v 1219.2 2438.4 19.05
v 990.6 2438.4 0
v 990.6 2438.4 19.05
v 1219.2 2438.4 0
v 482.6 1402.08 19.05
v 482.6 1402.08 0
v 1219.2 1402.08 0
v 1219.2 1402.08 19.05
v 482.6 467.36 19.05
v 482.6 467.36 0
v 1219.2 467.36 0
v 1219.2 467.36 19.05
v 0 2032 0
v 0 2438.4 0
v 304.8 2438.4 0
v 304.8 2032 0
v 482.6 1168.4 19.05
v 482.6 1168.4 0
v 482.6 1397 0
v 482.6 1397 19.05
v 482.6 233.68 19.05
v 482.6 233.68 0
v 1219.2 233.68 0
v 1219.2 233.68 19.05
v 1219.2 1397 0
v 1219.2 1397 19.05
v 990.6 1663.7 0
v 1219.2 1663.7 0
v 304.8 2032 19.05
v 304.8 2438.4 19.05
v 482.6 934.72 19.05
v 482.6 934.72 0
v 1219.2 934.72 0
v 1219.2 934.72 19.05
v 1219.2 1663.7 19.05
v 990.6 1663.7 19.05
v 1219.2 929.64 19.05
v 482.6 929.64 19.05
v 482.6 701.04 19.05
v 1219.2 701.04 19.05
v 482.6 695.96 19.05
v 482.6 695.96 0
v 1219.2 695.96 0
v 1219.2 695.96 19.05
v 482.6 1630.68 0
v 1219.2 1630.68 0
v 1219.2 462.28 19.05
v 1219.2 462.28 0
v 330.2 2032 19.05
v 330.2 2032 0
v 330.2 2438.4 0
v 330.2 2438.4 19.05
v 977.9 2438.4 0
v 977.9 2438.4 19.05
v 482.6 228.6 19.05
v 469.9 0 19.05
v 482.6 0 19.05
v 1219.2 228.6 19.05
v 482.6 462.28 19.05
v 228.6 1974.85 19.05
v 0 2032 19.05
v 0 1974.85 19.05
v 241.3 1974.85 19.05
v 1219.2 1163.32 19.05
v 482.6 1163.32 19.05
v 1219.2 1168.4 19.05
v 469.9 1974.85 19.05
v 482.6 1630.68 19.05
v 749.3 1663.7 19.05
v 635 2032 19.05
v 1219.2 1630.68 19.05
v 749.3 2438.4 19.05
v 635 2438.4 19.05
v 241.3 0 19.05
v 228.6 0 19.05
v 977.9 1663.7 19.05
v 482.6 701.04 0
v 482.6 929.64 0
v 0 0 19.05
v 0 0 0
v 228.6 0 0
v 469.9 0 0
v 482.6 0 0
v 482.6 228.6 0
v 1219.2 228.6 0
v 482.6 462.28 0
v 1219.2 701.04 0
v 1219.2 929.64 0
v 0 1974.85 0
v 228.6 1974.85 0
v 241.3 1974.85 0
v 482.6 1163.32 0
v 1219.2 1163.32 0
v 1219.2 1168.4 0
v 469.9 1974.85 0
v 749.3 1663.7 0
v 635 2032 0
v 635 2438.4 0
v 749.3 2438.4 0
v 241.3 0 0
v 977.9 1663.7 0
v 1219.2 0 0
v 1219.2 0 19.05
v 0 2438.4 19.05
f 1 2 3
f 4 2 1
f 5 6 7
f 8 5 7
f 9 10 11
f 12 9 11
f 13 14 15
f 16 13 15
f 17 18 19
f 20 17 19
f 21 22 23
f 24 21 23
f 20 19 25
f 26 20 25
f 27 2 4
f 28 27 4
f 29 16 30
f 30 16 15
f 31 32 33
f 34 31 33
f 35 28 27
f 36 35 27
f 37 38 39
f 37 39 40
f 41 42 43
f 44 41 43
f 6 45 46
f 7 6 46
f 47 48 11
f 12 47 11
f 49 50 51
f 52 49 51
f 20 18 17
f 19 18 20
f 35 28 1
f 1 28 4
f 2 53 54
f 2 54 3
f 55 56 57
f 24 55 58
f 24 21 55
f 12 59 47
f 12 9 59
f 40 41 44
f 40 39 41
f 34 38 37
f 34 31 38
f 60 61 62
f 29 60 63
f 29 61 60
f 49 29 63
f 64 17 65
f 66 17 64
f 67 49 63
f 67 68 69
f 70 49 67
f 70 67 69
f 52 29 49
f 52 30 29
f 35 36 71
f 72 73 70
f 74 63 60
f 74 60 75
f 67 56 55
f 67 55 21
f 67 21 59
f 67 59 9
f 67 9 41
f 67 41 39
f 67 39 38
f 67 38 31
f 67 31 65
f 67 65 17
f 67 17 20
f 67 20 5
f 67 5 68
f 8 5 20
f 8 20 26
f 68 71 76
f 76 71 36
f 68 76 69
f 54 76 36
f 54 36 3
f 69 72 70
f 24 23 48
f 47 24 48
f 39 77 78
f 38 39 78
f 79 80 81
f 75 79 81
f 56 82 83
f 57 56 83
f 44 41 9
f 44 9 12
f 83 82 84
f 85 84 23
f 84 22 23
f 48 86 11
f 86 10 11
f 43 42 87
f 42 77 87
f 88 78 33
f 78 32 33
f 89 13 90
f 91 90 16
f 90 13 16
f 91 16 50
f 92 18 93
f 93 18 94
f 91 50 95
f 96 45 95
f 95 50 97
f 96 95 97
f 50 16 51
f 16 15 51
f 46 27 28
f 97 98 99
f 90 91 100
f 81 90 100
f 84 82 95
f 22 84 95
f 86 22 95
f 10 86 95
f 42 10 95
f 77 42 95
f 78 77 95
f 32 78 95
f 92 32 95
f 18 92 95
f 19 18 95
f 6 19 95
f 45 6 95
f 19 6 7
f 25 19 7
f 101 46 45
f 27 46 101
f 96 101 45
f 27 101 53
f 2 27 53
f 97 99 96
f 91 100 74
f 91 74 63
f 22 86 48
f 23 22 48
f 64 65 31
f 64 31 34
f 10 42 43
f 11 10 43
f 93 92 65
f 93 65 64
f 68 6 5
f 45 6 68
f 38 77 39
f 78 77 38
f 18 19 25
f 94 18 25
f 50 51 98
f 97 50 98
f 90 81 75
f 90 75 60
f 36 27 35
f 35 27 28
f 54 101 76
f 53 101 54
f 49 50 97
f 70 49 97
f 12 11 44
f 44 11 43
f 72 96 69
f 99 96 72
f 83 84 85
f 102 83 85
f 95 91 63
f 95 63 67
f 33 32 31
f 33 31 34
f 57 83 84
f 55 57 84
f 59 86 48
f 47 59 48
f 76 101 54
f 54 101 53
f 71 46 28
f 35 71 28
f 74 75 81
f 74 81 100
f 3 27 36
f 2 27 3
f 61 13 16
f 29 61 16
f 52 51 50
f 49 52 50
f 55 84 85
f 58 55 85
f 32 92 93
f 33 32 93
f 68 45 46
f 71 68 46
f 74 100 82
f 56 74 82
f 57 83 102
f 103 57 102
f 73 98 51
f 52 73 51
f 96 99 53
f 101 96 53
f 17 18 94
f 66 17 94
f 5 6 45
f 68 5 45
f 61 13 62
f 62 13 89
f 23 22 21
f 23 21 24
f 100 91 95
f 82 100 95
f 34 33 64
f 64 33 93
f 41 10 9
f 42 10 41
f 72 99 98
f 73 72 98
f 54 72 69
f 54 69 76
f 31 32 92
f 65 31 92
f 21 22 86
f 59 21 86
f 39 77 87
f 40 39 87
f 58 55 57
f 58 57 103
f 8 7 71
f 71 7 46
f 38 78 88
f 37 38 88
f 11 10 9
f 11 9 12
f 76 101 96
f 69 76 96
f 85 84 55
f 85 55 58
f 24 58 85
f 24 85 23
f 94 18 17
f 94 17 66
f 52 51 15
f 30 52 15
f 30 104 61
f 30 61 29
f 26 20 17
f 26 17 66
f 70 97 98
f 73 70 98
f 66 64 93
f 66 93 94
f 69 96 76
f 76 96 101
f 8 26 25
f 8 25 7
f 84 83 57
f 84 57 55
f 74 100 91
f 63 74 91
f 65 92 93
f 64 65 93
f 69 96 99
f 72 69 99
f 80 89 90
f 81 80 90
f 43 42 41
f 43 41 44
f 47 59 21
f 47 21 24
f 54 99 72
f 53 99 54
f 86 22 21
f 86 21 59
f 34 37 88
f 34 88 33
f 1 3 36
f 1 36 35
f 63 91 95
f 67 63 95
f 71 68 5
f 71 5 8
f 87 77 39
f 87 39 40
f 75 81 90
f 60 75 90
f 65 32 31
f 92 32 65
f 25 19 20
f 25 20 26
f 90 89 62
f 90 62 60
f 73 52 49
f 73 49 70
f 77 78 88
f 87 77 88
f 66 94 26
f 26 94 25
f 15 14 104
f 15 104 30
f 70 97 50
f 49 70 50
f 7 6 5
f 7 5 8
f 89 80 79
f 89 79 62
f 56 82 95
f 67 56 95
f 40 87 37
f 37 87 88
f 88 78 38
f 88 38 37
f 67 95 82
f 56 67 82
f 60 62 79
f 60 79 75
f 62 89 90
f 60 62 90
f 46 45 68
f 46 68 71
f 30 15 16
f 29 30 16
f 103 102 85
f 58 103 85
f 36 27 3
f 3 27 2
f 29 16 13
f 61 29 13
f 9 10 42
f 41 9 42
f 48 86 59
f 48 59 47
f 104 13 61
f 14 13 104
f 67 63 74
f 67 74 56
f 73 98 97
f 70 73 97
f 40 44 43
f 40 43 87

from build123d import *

# Parameters (mm, degrees)
F0_W     = 12.7
F0_H     = 1974.85
F0_H_2   = 774.7
F0_W_2   = 736.6
F0_H_3   = 5.08
F1_DEPTH = 19.05
F0_W_3   = 228.6
F2_DEPTH = 19.05
F0_H_4   = 228.6
F0_W_4   = 304.8
F0_H_5   = 406.4


with BuildPart() as f1:
    # F0 (on Top) → F1 (new body)
    with BuildSketch(Plane.XY):
        Polygon((0, 2032), (0, 1974.85), (228.6, 1974.85), (241.3, 1974.85), (469.9, 1974.85), (469.9, 0), (482.6, 0), (482.6, 228.6), (482.6, 233.68), (482.6, 462.28), (482.6, 467.36), (482.6, 695.96), (482.6, 701.04), (482.6, 929.64), (482.6, 934.72), (482.6, 1163.32), (482.6, 1168.4), (482.6, 1397), (482.6, 1402.08), (482.6, 1630.68), (1219.2, 1630.68), (1219.2, 1663.7), (990.6, 1663.7), (977.9, 1663.7), (749.3, 1663.7), (749.3, 2438.4), (679.45, 2438.4), (635, 2438.4), (635, 2032), (330.2, 2032), (330.2, 2438.4), (304.8, 2438.4), (304.8, 2032), align=None)
        with Locations((234.95, 987.425)):
            Rectangle(F0_W, F0_H)
        with Locations((984.25, 2051.05)):
            Rectangle(F0_W, F0_H_2)
        with Locations((850.9, 1399.54)):
            Rectangle(F0_W_2, F0_H_3)
        with Locations((850.9, 1165.86)):
            Rectangle(F0_W_2, F0_H_3)
        with Locations((850.9, 932.18)):
            Rectangle(F0_W_2, F0_H_3)
        with Locations((850.9, 698.5)):
            Rectangle(F0_W_2, F0_H_3)
        with Locations((850.9, 464.82)):
            Rectangle(F0_W_2, F0_H_3)
        with Locations((850.9, 231.14)):
            Rectangle(F0_W_2, F0_H_3)
    extrude(amount=F1_DEPTH)


with BuildPart() as f2:
    # F0 (on Top) → F2 (new body)
    with BuildSketch(Plane.XY):
        with Locations((114.3, 987.425)):
            Rectangle(F0_W_3, F0_H)
    extrude(amount=F2_DEPTH)


with BuildPart() as f2b:
    # F0 (on Top) → F2, piece 2 (new body)
    with BuildSketch(Plane.XY):
        with Locations((355.6, 987.425)):
            Rectangle(F0_W_3, F0_H)
    extrude(amount=F2_DEPTH)


with BuildPart() as f2c:
    # F0 (on Top) → F2, piece 3 (new body)
    with BuildSketch(Plane.XY):
        with Locations((850.9, 1516.38)):
            Rectangle(F0_W_2, F0_H_4)
    extrude(amount=F2_DEPTH)


with BuildPart() as f2d:
    # F0 (on Top) → F2, piece 4 (new body)
    with BuildSketch(Plane.XY):
        with Locations((850.9, 1282.7)):
            Rectangle(F0_W_2, F0_H_4)
    extrude(amount=F2_DEPTH)


with BuildPart() as f2e:
    # F0 (on Top) → F2, piece 5 (new body)
    with BuildSketch(Plane.XY):
        with Locations((850.9, 1049.02)):
            Rectangle(F0_W_2, F0_H_4)
    extrude(amount=F2_DEPTH)


with BuildPart() as f2f:
    # F0 (on Top) → F2, piece 6 (new body)
    with BuildSketch(Plane.XY):
        with Locations((850.9, 815.34)):
            Rectangle(F0_W_2, F0_H_4)
    extrude(amount=F2_DEPTH)


with BuildPart() as f2g:
    # F0 (on Top) → F2, piece 7 (new body)
    with BuildSketch(Plane.XY):
        with Locations((850.9, 581.66)):
            Rectangle(F0_W_2, F0_H_4)
    extrude(amount=F2_DEPTH)


with BuildPart() as f2h:
    # F0 (on Top) → F2, piece 8 (new body)
    with BuildSketch(Plane.XY):
        with Locations((850.9, 347.98)):
            Rectangle(F0_W_2, F0_H_4)
    extrude(amount=F2_DEPTH)


with BuildPart() as f2i:
    # F0 (on Top) → F2, piece 9 (new body)
    with BuildSketch(Plane.XY):
        with Locations((850.9, 114.3)):
            Rectangle(F0_W_2, F0_H_4)
    extrude(amount=F2_DEPTH)


with BuildPart() as f2j:
    # F0 (on Top) → F2, piece 10 (new body)
    with BuildSketch(Plane.XY):
        with Locations((863.6, 2051.05)):
            Rectangle(F0_W_3, F0_H_2)
    extrude(amount=F2_DEPTH)


with BuildPart() as f2k:
    # F0 (on Top) → F2, piece 11 (new body)
    with BuildSketch(Plane.XY):
        with Locations((1104.9, 2051.05)):
            Rectangle(F0_W_3, F0_H_2)
    extrude(amount=F2_DEPTH)


with BuildPart() as f2l:
    # F0 (on Top) → F2, piece 12 (new body)
    with BuildSketch(Plane.XY):
        with Locations((152.4, 2235.2)):
            Rectangle(F0_W_4, F0_H_5)
    extrude(amount=F2_DEPTH)


with BuildPart() as f2m:
    # F0 (on Top) → F2, piece 13 (new body)
    with BuildSketch(Plane.XY):
        Polygon((374.65, 2438.4), (330.2, 2438.4), (330.2, 2032), (635, 2032), (635, 2438.4), align=None)
    extrude(amount=F2_DEPTH)


solid = Compound([f1.part, f2.part, f2b.part, f2c.part, f2d.part, f2e.part, f2f.part, f2g.part, f2h.part, f2i.part, f2j.part, f2k.part, f2l.part, f2m.part])
